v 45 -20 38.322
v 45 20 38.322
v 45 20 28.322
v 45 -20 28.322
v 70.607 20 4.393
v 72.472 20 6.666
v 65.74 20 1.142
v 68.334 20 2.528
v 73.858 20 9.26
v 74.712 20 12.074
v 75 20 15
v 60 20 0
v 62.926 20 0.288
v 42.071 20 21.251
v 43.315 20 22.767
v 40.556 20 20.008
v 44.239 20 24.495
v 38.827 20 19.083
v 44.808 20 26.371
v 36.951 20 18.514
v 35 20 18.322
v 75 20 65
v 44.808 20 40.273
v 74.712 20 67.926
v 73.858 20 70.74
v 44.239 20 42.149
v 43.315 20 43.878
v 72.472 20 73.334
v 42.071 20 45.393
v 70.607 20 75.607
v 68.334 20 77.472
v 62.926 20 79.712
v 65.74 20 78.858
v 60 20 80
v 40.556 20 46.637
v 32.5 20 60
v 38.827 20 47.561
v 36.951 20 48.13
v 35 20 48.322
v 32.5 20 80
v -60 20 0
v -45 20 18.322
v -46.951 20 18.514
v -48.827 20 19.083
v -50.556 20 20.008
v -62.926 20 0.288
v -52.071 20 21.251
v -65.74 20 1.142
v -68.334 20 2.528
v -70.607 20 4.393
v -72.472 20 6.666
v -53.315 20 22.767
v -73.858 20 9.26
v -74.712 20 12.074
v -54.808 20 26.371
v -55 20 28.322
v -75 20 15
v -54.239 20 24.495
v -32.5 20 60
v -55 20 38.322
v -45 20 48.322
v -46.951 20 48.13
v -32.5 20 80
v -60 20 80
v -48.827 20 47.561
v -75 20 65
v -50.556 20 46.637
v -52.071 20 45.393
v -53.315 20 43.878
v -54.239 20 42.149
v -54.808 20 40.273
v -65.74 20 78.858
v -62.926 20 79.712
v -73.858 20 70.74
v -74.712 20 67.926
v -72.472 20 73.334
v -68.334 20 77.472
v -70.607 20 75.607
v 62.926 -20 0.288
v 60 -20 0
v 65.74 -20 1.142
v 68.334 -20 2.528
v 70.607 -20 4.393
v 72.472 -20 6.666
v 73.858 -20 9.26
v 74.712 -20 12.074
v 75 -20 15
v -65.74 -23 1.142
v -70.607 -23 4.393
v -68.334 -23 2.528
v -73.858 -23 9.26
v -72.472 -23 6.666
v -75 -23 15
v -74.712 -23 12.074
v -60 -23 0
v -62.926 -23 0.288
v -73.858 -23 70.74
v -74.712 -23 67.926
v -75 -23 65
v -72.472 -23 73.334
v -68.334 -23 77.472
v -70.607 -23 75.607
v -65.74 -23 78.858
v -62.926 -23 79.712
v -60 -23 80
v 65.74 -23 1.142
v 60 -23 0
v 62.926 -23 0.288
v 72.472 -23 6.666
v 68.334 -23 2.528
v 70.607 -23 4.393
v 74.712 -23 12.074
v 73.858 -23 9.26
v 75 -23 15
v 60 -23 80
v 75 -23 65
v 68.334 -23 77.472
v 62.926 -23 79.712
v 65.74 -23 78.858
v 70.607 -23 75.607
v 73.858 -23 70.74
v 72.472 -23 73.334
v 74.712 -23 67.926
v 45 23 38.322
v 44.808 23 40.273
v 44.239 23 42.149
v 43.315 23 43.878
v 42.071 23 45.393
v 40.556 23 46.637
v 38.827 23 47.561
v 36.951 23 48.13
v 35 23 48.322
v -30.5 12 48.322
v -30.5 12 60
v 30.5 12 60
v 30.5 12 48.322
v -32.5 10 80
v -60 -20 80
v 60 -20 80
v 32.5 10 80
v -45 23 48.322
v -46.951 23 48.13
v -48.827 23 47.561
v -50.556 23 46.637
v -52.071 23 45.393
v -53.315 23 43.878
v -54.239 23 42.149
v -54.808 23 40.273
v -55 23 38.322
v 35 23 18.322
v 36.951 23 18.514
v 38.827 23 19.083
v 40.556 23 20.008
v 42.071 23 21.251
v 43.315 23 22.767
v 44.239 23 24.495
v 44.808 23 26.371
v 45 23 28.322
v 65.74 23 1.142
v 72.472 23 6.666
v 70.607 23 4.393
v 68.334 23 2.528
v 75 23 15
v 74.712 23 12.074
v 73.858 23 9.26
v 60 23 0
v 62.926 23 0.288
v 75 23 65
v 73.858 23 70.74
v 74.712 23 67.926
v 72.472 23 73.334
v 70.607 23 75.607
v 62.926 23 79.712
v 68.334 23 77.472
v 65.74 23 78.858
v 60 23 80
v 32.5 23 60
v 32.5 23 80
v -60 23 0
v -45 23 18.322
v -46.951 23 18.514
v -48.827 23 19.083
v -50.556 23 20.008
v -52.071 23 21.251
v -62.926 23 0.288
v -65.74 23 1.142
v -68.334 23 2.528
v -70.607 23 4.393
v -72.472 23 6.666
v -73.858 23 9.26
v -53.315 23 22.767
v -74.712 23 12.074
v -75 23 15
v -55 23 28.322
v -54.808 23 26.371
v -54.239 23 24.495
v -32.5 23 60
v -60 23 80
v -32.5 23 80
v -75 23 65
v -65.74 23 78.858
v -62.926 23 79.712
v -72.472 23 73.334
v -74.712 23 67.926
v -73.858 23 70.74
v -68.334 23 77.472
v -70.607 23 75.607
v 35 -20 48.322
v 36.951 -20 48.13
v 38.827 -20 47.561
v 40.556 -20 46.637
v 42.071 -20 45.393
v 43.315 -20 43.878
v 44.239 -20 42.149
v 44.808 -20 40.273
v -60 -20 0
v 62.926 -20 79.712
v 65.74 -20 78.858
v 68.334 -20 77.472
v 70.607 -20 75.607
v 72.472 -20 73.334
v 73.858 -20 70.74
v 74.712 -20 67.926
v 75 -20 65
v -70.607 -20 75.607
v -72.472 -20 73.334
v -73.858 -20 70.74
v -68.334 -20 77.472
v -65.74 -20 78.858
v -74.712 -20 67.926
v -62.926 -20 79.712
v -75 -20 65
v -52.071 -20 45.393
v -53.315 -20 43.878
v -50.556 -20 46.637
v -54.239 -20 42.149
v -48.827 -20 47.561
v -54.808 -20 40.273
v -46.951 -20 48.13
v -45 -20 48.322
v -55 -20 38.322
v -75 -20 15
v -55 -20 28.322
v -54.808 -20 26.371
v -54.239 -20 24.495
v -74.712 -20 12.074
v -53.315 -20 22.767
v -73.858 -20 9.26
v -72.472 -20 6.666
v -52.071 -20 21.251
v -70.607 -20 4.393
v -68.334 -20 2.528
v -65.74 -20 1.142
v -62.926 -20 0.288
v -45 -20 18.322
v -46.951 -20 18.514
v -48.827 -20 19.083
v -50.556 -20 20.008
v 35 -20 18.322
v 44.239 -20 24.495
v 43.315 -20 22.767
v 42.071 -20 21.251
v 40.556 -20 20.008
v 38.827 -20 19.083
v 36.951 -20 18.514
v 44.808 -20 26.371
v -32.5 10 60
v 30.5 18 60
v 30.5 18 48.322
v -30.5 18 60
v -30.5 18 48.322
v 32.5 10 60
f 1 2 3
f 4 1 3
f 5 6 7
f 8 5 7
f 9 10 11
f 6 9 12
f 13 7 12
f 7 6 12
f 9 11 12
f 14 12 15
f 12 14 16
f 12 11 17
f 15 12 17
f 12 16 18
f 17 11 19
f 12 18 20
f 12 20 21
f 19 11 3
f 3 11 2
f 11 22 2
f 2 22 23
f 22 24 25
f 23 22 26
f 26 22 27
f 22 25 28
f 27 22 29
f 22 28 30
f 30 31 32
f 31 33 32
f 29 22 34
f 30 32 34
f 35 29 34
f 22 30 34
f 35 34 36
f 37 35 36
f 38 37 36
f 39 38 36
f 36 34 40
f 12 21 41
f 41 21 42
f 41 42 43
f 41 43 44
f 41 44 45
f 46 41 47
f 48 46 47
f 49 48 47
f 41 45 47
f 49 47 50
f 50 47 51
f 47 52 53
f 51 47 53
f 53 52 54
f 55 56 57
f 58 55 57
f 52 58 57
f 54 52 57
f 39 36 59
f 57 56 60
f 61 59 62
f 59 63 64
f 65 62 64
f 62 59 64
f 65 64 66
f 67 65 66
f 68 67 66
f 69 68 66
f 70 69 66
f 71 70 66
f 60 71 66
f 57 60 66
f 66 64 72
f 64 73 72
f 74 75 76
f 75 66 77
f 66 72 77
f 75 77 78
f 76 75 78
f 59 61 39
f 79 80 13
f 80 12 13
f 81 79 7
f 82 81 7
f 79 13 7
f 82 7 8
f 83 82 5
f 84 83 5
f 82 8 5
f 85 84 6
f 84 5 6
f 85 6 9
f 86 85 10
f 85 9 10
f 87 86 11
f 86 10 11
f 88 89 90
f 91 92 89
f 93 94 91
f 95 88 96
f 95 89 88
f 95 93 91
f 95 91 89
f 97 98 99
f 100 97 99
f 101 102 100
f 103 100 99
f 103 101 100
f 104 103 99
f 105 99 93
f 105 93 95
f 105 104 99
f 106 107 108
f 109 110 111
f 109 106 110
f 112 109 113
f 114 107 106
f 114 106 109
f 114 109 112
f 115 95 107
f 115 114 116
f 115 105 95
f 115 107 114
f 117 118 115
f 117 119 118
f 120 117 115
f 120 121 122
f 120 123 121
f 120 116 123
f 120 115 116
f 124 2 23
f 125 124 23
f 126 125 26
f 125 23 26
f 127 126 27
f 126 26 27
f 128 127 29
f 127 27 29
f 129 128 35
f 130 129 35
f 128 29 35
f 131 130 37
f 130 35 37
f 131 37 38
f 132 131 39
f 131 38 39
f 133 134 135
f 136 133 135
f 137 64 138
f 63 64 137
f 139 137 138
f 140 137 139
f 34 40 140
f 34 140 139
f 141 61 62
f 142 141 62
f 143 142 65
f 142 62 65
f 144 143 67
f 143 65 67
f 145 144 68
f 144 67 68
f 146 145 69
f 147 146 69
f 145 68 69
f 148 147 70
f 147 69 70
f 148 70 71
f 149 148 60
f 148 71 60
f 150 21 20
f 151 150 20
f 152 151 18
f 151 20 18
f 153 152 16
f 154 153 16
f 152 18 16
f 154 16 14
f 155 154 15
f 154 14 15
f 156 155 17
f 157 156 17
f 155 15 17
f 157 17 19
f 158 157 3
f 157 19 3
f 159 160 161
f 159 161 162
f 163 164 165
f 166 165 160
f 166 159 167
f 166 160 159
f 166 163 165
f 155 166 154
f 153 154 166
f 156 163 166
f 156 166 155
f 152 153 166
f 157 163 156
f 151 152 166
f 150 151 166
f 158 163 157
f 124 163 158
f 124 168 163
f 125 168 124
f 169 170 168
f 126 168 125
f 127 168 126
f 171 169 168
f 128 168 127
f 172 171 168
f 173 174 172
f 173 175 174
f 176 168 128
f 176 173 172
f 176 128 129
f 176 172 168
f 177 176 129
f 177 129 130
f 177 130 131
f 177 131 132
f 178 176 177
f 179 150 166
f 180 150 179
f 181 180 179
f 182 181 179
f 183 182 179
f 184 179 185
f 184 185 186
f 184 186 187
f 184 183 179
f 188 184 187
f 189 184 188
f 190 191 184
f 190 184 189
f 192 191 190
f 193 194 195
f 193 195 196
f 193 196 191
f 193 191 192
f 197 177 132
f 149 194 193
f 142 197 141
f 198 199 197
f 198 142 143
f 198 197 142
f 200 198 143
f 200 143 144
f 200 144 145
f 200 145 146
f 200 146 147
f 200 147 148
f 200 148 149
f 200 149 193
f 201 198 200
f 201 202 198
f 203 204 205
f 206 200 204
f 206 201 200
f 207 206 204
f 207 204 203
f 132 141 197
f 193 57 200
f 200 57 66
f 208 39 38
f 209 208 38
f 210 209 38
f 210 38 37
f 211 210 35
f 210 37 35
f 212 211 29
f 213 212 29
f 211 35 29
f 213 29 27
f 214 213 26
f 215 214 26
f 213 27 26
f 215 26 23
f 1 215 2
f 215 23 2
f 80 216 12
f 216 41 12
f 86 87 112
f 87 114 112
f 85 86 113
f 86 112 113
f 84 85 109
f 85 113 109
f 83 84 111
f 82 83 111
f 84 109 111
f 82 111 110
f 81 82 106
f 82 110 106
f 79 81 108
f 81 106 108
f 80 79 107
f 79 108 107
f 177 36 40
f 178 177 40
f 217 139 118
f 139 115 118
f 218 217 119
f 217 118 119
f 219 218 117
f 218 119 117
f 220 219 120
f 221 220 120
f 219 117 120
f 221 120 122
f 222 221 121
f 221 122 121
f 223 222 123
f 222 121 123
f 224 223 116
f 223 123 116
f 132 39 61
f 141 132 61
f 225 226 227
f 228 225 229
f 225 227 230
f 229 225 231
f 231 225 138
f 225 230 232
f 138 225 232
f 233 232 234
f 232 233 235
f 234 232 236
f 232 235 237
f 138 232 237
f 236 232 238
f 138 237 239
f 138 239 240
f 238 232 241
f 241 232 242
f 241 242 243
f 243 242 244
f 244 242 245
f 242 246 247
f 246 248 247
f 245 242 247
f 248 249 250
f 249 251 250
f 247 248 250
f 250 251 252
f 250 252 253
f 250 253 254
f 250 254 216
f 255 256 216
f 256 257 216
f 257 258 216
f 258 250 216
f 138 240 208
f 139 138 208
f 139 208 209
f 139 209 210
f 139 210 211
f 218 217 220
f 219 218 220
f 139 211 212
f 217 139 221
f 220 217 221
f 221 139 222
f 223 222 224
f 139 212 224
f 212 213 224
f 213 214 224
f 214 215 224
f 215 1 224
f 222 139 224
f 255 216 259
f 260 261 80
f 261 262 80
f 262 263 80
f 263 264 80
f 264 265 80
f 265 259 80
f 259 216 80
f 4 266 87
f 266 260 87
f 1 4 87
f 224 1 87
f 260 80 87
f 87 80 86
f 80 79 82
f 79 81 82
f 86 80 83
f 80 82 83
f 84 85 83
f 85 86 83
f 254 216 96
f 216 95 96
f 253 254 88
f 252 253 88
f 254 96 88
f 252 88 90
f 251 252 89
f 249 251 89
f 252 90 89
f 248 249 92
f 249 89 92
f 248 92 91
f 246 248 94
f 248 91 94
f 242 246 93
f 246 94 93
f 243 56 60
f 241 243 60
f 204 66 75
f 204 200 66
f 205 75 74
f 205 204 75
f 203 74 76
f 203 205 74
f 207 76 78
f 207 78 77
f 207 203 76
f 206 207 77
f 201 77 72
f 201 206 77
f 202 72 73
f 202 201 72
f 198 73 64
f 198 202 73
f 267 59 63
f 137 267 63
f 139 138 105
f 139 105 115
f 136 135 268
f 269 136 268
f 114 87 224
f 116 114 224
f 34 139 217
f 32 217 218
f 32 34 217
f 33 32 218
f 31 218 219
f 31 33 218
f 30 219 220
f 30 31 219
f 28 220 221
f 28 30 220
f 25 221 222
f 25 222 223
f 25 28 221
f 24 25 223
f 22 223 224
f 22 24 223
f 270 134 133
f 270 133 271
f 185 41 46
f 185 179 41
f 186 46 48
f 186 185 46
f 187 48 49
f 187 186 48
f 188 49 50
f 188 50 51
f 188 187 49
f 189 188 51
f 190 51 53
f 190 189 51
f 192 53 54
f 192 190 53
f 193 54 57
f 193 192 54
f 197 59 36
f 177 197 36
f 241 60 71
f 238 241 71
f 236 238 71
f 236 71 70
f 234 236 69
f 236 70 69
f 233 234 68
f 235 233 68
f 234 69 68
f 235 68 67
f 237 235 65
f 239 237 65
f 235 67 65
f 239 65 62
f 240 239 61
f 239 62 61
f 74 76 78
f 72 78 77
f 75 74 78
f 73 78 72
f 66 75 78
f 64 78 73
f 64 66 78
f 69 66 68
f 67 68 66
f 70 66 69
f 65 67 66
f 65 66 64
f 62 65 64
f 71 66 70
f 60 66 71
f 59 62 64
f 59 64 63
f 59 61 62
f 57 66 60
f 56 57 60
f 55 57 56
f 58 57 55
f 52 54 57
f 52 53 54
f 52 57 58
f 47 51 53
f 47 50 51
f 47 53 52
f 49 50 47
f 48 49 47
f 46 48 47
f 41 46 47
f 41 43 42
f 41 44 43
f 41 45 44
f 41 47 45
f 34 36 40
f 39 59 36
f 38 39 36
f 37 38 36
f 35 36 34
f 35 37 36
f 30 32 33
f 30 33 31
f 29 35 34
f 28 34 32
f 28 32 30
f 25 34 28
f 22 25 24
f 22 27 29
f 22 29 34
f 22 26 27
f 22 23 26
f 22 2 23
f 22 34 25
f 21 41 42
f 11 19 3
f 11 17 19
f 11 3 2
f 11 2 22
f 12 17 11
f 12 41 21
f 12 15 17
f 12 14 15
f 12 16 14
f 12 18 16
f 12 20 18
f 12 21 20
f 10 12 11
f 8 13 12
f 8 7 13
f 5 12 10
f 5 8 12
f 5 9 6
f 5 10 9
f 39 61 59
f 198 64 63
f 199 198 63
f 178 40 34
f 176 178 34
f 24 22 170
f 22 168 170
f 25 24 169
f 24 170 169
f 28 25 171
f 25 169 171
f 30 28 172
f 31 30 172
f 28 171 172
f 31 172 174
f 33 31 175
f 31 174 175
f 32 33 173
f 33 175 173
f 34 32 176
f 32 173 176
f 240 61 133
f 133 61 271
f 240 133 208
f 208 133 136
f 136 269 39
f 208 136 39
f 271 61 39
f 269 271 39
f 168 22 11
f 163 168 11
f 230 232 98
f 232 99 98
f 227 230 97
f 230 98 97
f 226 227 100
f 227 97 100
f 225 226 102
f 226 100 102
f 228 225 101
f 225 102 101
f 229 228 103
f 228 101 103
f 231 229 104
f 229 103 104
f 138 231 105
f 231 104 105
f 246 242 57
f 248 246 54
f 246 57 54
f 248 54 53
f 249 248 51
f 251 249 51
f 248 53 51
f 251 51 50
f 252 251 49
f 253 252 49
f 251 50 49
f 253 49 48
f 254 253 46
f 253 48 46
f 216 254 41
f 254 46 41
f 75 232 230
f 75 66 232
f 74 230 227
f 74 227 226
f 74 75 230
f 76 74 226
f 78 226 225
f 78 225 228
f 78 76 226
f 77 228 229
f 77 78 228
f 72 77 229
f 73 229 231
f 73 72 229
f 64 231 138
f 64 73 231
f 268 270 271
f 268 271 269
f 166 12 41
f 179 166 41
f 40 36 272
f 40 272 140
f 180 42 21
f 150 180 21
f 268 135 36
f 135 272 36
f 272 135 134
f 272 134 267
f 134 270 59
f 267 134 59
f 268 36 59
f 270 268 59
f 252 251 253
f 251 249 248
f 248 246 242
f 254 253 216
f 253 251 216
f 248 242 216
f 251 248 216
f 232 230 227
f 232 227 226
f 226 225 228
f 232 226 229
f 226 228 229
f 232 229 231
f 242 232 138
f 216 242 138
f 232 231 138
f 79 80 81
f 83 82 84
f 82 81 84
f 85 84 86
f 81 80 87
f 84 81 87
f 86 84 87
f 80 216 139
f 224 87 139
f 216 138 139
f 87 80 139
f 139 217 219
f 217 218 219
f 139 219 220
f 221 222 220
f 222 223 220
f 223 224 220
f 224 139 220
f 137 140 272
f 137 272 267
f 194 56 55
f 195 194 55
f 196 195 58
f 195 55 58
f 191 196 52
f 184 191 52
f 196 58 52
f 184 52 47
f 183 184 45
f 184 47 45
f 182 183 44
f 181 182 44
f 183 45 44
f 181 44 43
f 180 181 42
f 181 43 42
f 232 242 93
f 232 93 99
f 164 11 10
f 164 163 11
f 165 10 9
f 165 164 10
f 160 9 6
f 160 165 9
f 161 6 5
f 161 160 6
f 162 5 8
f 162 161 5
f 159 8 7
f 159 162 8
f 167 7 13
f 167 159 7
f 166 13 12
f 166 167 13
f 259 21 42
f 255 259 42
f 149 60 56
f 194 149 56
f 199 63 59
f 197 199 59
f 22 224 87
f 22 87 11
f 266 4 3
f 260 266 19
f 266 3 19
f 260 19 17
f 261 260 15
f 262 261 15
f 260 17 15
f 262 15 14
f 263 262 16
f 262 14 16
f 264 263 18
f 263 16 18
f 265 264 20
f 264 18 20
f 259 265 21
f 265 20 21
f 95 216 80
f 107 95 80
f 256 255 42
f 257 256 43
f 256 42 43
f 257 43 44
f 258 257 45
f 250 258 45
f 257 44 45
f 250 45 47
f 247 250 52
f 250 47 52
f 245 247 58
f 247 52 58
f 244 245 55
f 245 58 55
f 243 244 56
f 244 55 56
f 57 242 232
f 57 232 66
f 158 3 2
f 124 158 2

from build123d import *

# Parameters (mm, degrees)
F0_W      = 150
F0_H      = 40
F1_DEPTH  = 80
F2_W      = 65
F2_H      = 20
F3_DEPTH  = 10
F5_DEPTH  = 68.2
F6_W      = 61
F6_H      = 6
F7_DEPTH  = 25
F9_DEPTH  = 3
F10_W     = 150
F10_H     = 80
F11_DEPTH = 3
F12_W     = 150
F12_H     = 80
F13_DEPTH = 3
F15_R     = 15
F16_R     = 15
F17_R     = 15
F18_R     = 15
F19_R     = 15
F20_R     = 15
F21_R     = 15
F22_R     = 15
F23_R     = 15
F24_R     = 15
F25_R     = 15
F26_R     = 15


with BuildPart() as f1:
    # F0 (on Top) → F1 (new body)
    with BuildSketch(Plane.XY):
        Rectangle(F0_W, F0_H)
    extrude(amount=F1_DEPTH)

    # F2 (on face) → F3 (cut)
    with BuildSketch(Plane(origin=(0, 20, 0), x_dir=(-1, 0, 0), z_dir=(0, 1, 0))):
        with Locations((0, 70)):
            Rectangle(F2_W, F2_H)
    extrude(amount=-F3_DEPTH, mode=Mode.SUBTRACT)

    # F4 (on face) → F5 (cut)
    with BuildSketch(Plane(origin=(0, 20, 0), x_dir=(-1, 0, 0), z_dir=(0, 1, 0))):
        with BuildLine():
            Line((45, 48.3222220466), (-35, 48.3222220466))
            ThreePointArc((-35, 48.3222220466), (-42.0710678119, 45.3932898584), (-45, 38.3222220466))
            Line((-45, 38.3222220466), (-45, 28.3222220466))
            ThreePointArc((-45, 28.3222220466), (-42.0710678119, 21.2511542347), (-35, 18.3222220466))
            Line((-35, 18.3222220466), (45, 18.3222220466))
            ThreePointArc((45, 18.3222220466), (52.0710678119, 21.2511542347), (55, 28.3222220466))
            Line((55, 28.3222220466), (55, 38.3222220466))
            ThreePointArc((55, 38.3222220466), (52.0710678119, 45.3932898584), (45, 48.3222220466))
        make_face()
    extrude(amount=-F5_DEPTH, mode=Mode.SUBTRACT)

    # F6 (on face) → F7 (cut)
    with BuildSketch(Plane.XY.offset(60)):
        with Locations((0, 15)):
            Rectangle(F6_W, F6_H)
    extrude(amount=-F7_DEPTH, mode=Mode.SUBTRACT)

    # F15
    f15_edges = [f1.edges().sort_by_distance(p)[0] for p in [
        (-75, 0, 80),
    ]]
    fillet(f15_edges, radius=F15_R)

    # F16
    f16_edges = [f1.edges().sort_by_distance(p)[0] for p in [
        (75, 0, 80),
    ]]
    fillet(f16_edges, radius=F16_R)

    # F17
    f17_edges = [f1.edges().sort_by_distance(p)[0] for p in [
        (-75, 0, 0),
    ]]
    fillet(f17_edges, radius=F17_R)

    # F18
    f18_edges = [f1.edges().sort_by_distance(p)[0] for p in [
        (75, 0, 0),
    ]]
    fillet(f18_edges, radius=F18_R)


with BuildPart() as f9:
    # F8 (on face) → F9 (new body)
    with BuildSketch(Plane(origin=(0, 20, 0), x_dir=(-1, 0, 0), z_dir=(0, 1, 0))):
        Polygon((-32.5, 80), (-75, 80), (-75, 0), (75, 0), (75, 80), (32.5, 80), (32.5, 60), (-32.5, 60), align=None)
        with BuildLine():
            ThreePointArc((-45, 38.3222220466), (-42.0710678119, 45.3932898584), (-35, 48.3222220466))
            Line((-35, 48.3222220466), (45, 48.3222220466))
            ThreePointArc((45, 48.3222220466), (52.0710678119, 45.3932898584), (55, 38.3222220466))
            Line((55, 38.3222220466), (55, 28.3222220466))
            ThreePointArc((55, 28.3222220466), (52.0710678119, 21.2511542347), (45, 18.3222220466))
            Line((45, 18.3222220466), (-35, 18.3222220466))
            ThreePointArc((-35, 18.3222220466), (-42.0710678119, 21.2511542347), (-45, 28.3222220466))
            Line((-45, 28.3222220466), (-45, 38.3222220466))
        make_face(mode=Mode.SUBTRACT)
    extrude(amount=F9_DEPTH)

    # F19
    f19_edges = [f9.edges().sort_by_distance(p)[0] for p in [
        (-75, 21.5, 80),
    ]]
    fillet(f19_edges, radius=F19_R)

    # F20
    f20_edges = [f9.edges().sort_by_distance(p)[0] for p in [
        (75, 21.5, 80),
    ]]
    fillet(f20_edges, radius=F20_R)

    # F21
    f21_edges = [f9.edges().sort_by_distance(p)[0] for p in [
        (75, 21.5, 0),
    ]]
    fillet(f21_edges, radius=F21_R)

    # F22
    f22_edges = [f9.edges().sort_by_distance(p)[0] for p in [
        (-75, 21.5, 0),
    ]]
    fillet(f22_edges, radius=F22_R)


with BuildPart() as f11:
    # F10 (on face) → F11 (new body)
    with BuildSketch(Plane.XZ.offset(20)):
        with Locations((0, 40)):
            Rectangle(F10_W, F10_H)
        with BuildLine():
            ThreePointArc((-55, 38.3222220466), (-52.0710678119, 45.3932898584), (-45, 48.3222220466))
            Line((-45, 48.3222220466), (35, 48.3222220466))
            ThreePointArc((35, 48.3222220466), (42.0710678119, 45.3932898584), (45, 38.3222220466))
            Line((45, 38.3222220466), (45, 28.3222220466))
            ThreePointArc((45, 28.3222220466), (42.0710678119, 21.2511542347), (35, 18.3222220466))
            Line((35, 18.3222220466), (-45, 18.3222220466))
            ThreePointArc((-45, 18.3222220466), (-52.0710678119, 21.2511542347), (-55, 28.3222220466))
            Line((-55, 28.3222220466), (-55, 38.3222220466))
        make_face(mode=Mode.SUBTRACT)
    extrude(amount=F11_DEPTH)


with BuildPart() as f13:
    # F12 (on face) → F13 (new body)
    with BuildSketch(Plane.XZ.offset(20)):
        with Locations((0, 40)):
            Rectangle(F12_W, F12_H)
    extrude(amount=F13_DEPTH)

    # F23
    f23_edges = [f13.edges().sort_by_distance(p)[0] for p in [
        (-75, -21.5, 80),
    ]]
    fillet(f23_edges, radius=F23_R)

    # F24
    f24_edges = [f13.edges().sort_by_distance(p)[0] for p in [
        (75, -21.5, 80),
    ]]
    fillet(f24_edges, radius=F24_R)

    # F25
    f25_edges = [f13.edges().sort_by_distance(p)[0] for p in [
        (75, -21.5, 0),
    ]]
    fillet(f25_edges, radius=F25_R)

    # F26
    f26_edges = [f13.edges().sort_by_distance(p)[0] for p in [
        (-75, -21.5, 0),
    ]]
    fillet(f26_edges, radius=F26_R)


solid = Compound([f1.part, f9.part, f13.part])
